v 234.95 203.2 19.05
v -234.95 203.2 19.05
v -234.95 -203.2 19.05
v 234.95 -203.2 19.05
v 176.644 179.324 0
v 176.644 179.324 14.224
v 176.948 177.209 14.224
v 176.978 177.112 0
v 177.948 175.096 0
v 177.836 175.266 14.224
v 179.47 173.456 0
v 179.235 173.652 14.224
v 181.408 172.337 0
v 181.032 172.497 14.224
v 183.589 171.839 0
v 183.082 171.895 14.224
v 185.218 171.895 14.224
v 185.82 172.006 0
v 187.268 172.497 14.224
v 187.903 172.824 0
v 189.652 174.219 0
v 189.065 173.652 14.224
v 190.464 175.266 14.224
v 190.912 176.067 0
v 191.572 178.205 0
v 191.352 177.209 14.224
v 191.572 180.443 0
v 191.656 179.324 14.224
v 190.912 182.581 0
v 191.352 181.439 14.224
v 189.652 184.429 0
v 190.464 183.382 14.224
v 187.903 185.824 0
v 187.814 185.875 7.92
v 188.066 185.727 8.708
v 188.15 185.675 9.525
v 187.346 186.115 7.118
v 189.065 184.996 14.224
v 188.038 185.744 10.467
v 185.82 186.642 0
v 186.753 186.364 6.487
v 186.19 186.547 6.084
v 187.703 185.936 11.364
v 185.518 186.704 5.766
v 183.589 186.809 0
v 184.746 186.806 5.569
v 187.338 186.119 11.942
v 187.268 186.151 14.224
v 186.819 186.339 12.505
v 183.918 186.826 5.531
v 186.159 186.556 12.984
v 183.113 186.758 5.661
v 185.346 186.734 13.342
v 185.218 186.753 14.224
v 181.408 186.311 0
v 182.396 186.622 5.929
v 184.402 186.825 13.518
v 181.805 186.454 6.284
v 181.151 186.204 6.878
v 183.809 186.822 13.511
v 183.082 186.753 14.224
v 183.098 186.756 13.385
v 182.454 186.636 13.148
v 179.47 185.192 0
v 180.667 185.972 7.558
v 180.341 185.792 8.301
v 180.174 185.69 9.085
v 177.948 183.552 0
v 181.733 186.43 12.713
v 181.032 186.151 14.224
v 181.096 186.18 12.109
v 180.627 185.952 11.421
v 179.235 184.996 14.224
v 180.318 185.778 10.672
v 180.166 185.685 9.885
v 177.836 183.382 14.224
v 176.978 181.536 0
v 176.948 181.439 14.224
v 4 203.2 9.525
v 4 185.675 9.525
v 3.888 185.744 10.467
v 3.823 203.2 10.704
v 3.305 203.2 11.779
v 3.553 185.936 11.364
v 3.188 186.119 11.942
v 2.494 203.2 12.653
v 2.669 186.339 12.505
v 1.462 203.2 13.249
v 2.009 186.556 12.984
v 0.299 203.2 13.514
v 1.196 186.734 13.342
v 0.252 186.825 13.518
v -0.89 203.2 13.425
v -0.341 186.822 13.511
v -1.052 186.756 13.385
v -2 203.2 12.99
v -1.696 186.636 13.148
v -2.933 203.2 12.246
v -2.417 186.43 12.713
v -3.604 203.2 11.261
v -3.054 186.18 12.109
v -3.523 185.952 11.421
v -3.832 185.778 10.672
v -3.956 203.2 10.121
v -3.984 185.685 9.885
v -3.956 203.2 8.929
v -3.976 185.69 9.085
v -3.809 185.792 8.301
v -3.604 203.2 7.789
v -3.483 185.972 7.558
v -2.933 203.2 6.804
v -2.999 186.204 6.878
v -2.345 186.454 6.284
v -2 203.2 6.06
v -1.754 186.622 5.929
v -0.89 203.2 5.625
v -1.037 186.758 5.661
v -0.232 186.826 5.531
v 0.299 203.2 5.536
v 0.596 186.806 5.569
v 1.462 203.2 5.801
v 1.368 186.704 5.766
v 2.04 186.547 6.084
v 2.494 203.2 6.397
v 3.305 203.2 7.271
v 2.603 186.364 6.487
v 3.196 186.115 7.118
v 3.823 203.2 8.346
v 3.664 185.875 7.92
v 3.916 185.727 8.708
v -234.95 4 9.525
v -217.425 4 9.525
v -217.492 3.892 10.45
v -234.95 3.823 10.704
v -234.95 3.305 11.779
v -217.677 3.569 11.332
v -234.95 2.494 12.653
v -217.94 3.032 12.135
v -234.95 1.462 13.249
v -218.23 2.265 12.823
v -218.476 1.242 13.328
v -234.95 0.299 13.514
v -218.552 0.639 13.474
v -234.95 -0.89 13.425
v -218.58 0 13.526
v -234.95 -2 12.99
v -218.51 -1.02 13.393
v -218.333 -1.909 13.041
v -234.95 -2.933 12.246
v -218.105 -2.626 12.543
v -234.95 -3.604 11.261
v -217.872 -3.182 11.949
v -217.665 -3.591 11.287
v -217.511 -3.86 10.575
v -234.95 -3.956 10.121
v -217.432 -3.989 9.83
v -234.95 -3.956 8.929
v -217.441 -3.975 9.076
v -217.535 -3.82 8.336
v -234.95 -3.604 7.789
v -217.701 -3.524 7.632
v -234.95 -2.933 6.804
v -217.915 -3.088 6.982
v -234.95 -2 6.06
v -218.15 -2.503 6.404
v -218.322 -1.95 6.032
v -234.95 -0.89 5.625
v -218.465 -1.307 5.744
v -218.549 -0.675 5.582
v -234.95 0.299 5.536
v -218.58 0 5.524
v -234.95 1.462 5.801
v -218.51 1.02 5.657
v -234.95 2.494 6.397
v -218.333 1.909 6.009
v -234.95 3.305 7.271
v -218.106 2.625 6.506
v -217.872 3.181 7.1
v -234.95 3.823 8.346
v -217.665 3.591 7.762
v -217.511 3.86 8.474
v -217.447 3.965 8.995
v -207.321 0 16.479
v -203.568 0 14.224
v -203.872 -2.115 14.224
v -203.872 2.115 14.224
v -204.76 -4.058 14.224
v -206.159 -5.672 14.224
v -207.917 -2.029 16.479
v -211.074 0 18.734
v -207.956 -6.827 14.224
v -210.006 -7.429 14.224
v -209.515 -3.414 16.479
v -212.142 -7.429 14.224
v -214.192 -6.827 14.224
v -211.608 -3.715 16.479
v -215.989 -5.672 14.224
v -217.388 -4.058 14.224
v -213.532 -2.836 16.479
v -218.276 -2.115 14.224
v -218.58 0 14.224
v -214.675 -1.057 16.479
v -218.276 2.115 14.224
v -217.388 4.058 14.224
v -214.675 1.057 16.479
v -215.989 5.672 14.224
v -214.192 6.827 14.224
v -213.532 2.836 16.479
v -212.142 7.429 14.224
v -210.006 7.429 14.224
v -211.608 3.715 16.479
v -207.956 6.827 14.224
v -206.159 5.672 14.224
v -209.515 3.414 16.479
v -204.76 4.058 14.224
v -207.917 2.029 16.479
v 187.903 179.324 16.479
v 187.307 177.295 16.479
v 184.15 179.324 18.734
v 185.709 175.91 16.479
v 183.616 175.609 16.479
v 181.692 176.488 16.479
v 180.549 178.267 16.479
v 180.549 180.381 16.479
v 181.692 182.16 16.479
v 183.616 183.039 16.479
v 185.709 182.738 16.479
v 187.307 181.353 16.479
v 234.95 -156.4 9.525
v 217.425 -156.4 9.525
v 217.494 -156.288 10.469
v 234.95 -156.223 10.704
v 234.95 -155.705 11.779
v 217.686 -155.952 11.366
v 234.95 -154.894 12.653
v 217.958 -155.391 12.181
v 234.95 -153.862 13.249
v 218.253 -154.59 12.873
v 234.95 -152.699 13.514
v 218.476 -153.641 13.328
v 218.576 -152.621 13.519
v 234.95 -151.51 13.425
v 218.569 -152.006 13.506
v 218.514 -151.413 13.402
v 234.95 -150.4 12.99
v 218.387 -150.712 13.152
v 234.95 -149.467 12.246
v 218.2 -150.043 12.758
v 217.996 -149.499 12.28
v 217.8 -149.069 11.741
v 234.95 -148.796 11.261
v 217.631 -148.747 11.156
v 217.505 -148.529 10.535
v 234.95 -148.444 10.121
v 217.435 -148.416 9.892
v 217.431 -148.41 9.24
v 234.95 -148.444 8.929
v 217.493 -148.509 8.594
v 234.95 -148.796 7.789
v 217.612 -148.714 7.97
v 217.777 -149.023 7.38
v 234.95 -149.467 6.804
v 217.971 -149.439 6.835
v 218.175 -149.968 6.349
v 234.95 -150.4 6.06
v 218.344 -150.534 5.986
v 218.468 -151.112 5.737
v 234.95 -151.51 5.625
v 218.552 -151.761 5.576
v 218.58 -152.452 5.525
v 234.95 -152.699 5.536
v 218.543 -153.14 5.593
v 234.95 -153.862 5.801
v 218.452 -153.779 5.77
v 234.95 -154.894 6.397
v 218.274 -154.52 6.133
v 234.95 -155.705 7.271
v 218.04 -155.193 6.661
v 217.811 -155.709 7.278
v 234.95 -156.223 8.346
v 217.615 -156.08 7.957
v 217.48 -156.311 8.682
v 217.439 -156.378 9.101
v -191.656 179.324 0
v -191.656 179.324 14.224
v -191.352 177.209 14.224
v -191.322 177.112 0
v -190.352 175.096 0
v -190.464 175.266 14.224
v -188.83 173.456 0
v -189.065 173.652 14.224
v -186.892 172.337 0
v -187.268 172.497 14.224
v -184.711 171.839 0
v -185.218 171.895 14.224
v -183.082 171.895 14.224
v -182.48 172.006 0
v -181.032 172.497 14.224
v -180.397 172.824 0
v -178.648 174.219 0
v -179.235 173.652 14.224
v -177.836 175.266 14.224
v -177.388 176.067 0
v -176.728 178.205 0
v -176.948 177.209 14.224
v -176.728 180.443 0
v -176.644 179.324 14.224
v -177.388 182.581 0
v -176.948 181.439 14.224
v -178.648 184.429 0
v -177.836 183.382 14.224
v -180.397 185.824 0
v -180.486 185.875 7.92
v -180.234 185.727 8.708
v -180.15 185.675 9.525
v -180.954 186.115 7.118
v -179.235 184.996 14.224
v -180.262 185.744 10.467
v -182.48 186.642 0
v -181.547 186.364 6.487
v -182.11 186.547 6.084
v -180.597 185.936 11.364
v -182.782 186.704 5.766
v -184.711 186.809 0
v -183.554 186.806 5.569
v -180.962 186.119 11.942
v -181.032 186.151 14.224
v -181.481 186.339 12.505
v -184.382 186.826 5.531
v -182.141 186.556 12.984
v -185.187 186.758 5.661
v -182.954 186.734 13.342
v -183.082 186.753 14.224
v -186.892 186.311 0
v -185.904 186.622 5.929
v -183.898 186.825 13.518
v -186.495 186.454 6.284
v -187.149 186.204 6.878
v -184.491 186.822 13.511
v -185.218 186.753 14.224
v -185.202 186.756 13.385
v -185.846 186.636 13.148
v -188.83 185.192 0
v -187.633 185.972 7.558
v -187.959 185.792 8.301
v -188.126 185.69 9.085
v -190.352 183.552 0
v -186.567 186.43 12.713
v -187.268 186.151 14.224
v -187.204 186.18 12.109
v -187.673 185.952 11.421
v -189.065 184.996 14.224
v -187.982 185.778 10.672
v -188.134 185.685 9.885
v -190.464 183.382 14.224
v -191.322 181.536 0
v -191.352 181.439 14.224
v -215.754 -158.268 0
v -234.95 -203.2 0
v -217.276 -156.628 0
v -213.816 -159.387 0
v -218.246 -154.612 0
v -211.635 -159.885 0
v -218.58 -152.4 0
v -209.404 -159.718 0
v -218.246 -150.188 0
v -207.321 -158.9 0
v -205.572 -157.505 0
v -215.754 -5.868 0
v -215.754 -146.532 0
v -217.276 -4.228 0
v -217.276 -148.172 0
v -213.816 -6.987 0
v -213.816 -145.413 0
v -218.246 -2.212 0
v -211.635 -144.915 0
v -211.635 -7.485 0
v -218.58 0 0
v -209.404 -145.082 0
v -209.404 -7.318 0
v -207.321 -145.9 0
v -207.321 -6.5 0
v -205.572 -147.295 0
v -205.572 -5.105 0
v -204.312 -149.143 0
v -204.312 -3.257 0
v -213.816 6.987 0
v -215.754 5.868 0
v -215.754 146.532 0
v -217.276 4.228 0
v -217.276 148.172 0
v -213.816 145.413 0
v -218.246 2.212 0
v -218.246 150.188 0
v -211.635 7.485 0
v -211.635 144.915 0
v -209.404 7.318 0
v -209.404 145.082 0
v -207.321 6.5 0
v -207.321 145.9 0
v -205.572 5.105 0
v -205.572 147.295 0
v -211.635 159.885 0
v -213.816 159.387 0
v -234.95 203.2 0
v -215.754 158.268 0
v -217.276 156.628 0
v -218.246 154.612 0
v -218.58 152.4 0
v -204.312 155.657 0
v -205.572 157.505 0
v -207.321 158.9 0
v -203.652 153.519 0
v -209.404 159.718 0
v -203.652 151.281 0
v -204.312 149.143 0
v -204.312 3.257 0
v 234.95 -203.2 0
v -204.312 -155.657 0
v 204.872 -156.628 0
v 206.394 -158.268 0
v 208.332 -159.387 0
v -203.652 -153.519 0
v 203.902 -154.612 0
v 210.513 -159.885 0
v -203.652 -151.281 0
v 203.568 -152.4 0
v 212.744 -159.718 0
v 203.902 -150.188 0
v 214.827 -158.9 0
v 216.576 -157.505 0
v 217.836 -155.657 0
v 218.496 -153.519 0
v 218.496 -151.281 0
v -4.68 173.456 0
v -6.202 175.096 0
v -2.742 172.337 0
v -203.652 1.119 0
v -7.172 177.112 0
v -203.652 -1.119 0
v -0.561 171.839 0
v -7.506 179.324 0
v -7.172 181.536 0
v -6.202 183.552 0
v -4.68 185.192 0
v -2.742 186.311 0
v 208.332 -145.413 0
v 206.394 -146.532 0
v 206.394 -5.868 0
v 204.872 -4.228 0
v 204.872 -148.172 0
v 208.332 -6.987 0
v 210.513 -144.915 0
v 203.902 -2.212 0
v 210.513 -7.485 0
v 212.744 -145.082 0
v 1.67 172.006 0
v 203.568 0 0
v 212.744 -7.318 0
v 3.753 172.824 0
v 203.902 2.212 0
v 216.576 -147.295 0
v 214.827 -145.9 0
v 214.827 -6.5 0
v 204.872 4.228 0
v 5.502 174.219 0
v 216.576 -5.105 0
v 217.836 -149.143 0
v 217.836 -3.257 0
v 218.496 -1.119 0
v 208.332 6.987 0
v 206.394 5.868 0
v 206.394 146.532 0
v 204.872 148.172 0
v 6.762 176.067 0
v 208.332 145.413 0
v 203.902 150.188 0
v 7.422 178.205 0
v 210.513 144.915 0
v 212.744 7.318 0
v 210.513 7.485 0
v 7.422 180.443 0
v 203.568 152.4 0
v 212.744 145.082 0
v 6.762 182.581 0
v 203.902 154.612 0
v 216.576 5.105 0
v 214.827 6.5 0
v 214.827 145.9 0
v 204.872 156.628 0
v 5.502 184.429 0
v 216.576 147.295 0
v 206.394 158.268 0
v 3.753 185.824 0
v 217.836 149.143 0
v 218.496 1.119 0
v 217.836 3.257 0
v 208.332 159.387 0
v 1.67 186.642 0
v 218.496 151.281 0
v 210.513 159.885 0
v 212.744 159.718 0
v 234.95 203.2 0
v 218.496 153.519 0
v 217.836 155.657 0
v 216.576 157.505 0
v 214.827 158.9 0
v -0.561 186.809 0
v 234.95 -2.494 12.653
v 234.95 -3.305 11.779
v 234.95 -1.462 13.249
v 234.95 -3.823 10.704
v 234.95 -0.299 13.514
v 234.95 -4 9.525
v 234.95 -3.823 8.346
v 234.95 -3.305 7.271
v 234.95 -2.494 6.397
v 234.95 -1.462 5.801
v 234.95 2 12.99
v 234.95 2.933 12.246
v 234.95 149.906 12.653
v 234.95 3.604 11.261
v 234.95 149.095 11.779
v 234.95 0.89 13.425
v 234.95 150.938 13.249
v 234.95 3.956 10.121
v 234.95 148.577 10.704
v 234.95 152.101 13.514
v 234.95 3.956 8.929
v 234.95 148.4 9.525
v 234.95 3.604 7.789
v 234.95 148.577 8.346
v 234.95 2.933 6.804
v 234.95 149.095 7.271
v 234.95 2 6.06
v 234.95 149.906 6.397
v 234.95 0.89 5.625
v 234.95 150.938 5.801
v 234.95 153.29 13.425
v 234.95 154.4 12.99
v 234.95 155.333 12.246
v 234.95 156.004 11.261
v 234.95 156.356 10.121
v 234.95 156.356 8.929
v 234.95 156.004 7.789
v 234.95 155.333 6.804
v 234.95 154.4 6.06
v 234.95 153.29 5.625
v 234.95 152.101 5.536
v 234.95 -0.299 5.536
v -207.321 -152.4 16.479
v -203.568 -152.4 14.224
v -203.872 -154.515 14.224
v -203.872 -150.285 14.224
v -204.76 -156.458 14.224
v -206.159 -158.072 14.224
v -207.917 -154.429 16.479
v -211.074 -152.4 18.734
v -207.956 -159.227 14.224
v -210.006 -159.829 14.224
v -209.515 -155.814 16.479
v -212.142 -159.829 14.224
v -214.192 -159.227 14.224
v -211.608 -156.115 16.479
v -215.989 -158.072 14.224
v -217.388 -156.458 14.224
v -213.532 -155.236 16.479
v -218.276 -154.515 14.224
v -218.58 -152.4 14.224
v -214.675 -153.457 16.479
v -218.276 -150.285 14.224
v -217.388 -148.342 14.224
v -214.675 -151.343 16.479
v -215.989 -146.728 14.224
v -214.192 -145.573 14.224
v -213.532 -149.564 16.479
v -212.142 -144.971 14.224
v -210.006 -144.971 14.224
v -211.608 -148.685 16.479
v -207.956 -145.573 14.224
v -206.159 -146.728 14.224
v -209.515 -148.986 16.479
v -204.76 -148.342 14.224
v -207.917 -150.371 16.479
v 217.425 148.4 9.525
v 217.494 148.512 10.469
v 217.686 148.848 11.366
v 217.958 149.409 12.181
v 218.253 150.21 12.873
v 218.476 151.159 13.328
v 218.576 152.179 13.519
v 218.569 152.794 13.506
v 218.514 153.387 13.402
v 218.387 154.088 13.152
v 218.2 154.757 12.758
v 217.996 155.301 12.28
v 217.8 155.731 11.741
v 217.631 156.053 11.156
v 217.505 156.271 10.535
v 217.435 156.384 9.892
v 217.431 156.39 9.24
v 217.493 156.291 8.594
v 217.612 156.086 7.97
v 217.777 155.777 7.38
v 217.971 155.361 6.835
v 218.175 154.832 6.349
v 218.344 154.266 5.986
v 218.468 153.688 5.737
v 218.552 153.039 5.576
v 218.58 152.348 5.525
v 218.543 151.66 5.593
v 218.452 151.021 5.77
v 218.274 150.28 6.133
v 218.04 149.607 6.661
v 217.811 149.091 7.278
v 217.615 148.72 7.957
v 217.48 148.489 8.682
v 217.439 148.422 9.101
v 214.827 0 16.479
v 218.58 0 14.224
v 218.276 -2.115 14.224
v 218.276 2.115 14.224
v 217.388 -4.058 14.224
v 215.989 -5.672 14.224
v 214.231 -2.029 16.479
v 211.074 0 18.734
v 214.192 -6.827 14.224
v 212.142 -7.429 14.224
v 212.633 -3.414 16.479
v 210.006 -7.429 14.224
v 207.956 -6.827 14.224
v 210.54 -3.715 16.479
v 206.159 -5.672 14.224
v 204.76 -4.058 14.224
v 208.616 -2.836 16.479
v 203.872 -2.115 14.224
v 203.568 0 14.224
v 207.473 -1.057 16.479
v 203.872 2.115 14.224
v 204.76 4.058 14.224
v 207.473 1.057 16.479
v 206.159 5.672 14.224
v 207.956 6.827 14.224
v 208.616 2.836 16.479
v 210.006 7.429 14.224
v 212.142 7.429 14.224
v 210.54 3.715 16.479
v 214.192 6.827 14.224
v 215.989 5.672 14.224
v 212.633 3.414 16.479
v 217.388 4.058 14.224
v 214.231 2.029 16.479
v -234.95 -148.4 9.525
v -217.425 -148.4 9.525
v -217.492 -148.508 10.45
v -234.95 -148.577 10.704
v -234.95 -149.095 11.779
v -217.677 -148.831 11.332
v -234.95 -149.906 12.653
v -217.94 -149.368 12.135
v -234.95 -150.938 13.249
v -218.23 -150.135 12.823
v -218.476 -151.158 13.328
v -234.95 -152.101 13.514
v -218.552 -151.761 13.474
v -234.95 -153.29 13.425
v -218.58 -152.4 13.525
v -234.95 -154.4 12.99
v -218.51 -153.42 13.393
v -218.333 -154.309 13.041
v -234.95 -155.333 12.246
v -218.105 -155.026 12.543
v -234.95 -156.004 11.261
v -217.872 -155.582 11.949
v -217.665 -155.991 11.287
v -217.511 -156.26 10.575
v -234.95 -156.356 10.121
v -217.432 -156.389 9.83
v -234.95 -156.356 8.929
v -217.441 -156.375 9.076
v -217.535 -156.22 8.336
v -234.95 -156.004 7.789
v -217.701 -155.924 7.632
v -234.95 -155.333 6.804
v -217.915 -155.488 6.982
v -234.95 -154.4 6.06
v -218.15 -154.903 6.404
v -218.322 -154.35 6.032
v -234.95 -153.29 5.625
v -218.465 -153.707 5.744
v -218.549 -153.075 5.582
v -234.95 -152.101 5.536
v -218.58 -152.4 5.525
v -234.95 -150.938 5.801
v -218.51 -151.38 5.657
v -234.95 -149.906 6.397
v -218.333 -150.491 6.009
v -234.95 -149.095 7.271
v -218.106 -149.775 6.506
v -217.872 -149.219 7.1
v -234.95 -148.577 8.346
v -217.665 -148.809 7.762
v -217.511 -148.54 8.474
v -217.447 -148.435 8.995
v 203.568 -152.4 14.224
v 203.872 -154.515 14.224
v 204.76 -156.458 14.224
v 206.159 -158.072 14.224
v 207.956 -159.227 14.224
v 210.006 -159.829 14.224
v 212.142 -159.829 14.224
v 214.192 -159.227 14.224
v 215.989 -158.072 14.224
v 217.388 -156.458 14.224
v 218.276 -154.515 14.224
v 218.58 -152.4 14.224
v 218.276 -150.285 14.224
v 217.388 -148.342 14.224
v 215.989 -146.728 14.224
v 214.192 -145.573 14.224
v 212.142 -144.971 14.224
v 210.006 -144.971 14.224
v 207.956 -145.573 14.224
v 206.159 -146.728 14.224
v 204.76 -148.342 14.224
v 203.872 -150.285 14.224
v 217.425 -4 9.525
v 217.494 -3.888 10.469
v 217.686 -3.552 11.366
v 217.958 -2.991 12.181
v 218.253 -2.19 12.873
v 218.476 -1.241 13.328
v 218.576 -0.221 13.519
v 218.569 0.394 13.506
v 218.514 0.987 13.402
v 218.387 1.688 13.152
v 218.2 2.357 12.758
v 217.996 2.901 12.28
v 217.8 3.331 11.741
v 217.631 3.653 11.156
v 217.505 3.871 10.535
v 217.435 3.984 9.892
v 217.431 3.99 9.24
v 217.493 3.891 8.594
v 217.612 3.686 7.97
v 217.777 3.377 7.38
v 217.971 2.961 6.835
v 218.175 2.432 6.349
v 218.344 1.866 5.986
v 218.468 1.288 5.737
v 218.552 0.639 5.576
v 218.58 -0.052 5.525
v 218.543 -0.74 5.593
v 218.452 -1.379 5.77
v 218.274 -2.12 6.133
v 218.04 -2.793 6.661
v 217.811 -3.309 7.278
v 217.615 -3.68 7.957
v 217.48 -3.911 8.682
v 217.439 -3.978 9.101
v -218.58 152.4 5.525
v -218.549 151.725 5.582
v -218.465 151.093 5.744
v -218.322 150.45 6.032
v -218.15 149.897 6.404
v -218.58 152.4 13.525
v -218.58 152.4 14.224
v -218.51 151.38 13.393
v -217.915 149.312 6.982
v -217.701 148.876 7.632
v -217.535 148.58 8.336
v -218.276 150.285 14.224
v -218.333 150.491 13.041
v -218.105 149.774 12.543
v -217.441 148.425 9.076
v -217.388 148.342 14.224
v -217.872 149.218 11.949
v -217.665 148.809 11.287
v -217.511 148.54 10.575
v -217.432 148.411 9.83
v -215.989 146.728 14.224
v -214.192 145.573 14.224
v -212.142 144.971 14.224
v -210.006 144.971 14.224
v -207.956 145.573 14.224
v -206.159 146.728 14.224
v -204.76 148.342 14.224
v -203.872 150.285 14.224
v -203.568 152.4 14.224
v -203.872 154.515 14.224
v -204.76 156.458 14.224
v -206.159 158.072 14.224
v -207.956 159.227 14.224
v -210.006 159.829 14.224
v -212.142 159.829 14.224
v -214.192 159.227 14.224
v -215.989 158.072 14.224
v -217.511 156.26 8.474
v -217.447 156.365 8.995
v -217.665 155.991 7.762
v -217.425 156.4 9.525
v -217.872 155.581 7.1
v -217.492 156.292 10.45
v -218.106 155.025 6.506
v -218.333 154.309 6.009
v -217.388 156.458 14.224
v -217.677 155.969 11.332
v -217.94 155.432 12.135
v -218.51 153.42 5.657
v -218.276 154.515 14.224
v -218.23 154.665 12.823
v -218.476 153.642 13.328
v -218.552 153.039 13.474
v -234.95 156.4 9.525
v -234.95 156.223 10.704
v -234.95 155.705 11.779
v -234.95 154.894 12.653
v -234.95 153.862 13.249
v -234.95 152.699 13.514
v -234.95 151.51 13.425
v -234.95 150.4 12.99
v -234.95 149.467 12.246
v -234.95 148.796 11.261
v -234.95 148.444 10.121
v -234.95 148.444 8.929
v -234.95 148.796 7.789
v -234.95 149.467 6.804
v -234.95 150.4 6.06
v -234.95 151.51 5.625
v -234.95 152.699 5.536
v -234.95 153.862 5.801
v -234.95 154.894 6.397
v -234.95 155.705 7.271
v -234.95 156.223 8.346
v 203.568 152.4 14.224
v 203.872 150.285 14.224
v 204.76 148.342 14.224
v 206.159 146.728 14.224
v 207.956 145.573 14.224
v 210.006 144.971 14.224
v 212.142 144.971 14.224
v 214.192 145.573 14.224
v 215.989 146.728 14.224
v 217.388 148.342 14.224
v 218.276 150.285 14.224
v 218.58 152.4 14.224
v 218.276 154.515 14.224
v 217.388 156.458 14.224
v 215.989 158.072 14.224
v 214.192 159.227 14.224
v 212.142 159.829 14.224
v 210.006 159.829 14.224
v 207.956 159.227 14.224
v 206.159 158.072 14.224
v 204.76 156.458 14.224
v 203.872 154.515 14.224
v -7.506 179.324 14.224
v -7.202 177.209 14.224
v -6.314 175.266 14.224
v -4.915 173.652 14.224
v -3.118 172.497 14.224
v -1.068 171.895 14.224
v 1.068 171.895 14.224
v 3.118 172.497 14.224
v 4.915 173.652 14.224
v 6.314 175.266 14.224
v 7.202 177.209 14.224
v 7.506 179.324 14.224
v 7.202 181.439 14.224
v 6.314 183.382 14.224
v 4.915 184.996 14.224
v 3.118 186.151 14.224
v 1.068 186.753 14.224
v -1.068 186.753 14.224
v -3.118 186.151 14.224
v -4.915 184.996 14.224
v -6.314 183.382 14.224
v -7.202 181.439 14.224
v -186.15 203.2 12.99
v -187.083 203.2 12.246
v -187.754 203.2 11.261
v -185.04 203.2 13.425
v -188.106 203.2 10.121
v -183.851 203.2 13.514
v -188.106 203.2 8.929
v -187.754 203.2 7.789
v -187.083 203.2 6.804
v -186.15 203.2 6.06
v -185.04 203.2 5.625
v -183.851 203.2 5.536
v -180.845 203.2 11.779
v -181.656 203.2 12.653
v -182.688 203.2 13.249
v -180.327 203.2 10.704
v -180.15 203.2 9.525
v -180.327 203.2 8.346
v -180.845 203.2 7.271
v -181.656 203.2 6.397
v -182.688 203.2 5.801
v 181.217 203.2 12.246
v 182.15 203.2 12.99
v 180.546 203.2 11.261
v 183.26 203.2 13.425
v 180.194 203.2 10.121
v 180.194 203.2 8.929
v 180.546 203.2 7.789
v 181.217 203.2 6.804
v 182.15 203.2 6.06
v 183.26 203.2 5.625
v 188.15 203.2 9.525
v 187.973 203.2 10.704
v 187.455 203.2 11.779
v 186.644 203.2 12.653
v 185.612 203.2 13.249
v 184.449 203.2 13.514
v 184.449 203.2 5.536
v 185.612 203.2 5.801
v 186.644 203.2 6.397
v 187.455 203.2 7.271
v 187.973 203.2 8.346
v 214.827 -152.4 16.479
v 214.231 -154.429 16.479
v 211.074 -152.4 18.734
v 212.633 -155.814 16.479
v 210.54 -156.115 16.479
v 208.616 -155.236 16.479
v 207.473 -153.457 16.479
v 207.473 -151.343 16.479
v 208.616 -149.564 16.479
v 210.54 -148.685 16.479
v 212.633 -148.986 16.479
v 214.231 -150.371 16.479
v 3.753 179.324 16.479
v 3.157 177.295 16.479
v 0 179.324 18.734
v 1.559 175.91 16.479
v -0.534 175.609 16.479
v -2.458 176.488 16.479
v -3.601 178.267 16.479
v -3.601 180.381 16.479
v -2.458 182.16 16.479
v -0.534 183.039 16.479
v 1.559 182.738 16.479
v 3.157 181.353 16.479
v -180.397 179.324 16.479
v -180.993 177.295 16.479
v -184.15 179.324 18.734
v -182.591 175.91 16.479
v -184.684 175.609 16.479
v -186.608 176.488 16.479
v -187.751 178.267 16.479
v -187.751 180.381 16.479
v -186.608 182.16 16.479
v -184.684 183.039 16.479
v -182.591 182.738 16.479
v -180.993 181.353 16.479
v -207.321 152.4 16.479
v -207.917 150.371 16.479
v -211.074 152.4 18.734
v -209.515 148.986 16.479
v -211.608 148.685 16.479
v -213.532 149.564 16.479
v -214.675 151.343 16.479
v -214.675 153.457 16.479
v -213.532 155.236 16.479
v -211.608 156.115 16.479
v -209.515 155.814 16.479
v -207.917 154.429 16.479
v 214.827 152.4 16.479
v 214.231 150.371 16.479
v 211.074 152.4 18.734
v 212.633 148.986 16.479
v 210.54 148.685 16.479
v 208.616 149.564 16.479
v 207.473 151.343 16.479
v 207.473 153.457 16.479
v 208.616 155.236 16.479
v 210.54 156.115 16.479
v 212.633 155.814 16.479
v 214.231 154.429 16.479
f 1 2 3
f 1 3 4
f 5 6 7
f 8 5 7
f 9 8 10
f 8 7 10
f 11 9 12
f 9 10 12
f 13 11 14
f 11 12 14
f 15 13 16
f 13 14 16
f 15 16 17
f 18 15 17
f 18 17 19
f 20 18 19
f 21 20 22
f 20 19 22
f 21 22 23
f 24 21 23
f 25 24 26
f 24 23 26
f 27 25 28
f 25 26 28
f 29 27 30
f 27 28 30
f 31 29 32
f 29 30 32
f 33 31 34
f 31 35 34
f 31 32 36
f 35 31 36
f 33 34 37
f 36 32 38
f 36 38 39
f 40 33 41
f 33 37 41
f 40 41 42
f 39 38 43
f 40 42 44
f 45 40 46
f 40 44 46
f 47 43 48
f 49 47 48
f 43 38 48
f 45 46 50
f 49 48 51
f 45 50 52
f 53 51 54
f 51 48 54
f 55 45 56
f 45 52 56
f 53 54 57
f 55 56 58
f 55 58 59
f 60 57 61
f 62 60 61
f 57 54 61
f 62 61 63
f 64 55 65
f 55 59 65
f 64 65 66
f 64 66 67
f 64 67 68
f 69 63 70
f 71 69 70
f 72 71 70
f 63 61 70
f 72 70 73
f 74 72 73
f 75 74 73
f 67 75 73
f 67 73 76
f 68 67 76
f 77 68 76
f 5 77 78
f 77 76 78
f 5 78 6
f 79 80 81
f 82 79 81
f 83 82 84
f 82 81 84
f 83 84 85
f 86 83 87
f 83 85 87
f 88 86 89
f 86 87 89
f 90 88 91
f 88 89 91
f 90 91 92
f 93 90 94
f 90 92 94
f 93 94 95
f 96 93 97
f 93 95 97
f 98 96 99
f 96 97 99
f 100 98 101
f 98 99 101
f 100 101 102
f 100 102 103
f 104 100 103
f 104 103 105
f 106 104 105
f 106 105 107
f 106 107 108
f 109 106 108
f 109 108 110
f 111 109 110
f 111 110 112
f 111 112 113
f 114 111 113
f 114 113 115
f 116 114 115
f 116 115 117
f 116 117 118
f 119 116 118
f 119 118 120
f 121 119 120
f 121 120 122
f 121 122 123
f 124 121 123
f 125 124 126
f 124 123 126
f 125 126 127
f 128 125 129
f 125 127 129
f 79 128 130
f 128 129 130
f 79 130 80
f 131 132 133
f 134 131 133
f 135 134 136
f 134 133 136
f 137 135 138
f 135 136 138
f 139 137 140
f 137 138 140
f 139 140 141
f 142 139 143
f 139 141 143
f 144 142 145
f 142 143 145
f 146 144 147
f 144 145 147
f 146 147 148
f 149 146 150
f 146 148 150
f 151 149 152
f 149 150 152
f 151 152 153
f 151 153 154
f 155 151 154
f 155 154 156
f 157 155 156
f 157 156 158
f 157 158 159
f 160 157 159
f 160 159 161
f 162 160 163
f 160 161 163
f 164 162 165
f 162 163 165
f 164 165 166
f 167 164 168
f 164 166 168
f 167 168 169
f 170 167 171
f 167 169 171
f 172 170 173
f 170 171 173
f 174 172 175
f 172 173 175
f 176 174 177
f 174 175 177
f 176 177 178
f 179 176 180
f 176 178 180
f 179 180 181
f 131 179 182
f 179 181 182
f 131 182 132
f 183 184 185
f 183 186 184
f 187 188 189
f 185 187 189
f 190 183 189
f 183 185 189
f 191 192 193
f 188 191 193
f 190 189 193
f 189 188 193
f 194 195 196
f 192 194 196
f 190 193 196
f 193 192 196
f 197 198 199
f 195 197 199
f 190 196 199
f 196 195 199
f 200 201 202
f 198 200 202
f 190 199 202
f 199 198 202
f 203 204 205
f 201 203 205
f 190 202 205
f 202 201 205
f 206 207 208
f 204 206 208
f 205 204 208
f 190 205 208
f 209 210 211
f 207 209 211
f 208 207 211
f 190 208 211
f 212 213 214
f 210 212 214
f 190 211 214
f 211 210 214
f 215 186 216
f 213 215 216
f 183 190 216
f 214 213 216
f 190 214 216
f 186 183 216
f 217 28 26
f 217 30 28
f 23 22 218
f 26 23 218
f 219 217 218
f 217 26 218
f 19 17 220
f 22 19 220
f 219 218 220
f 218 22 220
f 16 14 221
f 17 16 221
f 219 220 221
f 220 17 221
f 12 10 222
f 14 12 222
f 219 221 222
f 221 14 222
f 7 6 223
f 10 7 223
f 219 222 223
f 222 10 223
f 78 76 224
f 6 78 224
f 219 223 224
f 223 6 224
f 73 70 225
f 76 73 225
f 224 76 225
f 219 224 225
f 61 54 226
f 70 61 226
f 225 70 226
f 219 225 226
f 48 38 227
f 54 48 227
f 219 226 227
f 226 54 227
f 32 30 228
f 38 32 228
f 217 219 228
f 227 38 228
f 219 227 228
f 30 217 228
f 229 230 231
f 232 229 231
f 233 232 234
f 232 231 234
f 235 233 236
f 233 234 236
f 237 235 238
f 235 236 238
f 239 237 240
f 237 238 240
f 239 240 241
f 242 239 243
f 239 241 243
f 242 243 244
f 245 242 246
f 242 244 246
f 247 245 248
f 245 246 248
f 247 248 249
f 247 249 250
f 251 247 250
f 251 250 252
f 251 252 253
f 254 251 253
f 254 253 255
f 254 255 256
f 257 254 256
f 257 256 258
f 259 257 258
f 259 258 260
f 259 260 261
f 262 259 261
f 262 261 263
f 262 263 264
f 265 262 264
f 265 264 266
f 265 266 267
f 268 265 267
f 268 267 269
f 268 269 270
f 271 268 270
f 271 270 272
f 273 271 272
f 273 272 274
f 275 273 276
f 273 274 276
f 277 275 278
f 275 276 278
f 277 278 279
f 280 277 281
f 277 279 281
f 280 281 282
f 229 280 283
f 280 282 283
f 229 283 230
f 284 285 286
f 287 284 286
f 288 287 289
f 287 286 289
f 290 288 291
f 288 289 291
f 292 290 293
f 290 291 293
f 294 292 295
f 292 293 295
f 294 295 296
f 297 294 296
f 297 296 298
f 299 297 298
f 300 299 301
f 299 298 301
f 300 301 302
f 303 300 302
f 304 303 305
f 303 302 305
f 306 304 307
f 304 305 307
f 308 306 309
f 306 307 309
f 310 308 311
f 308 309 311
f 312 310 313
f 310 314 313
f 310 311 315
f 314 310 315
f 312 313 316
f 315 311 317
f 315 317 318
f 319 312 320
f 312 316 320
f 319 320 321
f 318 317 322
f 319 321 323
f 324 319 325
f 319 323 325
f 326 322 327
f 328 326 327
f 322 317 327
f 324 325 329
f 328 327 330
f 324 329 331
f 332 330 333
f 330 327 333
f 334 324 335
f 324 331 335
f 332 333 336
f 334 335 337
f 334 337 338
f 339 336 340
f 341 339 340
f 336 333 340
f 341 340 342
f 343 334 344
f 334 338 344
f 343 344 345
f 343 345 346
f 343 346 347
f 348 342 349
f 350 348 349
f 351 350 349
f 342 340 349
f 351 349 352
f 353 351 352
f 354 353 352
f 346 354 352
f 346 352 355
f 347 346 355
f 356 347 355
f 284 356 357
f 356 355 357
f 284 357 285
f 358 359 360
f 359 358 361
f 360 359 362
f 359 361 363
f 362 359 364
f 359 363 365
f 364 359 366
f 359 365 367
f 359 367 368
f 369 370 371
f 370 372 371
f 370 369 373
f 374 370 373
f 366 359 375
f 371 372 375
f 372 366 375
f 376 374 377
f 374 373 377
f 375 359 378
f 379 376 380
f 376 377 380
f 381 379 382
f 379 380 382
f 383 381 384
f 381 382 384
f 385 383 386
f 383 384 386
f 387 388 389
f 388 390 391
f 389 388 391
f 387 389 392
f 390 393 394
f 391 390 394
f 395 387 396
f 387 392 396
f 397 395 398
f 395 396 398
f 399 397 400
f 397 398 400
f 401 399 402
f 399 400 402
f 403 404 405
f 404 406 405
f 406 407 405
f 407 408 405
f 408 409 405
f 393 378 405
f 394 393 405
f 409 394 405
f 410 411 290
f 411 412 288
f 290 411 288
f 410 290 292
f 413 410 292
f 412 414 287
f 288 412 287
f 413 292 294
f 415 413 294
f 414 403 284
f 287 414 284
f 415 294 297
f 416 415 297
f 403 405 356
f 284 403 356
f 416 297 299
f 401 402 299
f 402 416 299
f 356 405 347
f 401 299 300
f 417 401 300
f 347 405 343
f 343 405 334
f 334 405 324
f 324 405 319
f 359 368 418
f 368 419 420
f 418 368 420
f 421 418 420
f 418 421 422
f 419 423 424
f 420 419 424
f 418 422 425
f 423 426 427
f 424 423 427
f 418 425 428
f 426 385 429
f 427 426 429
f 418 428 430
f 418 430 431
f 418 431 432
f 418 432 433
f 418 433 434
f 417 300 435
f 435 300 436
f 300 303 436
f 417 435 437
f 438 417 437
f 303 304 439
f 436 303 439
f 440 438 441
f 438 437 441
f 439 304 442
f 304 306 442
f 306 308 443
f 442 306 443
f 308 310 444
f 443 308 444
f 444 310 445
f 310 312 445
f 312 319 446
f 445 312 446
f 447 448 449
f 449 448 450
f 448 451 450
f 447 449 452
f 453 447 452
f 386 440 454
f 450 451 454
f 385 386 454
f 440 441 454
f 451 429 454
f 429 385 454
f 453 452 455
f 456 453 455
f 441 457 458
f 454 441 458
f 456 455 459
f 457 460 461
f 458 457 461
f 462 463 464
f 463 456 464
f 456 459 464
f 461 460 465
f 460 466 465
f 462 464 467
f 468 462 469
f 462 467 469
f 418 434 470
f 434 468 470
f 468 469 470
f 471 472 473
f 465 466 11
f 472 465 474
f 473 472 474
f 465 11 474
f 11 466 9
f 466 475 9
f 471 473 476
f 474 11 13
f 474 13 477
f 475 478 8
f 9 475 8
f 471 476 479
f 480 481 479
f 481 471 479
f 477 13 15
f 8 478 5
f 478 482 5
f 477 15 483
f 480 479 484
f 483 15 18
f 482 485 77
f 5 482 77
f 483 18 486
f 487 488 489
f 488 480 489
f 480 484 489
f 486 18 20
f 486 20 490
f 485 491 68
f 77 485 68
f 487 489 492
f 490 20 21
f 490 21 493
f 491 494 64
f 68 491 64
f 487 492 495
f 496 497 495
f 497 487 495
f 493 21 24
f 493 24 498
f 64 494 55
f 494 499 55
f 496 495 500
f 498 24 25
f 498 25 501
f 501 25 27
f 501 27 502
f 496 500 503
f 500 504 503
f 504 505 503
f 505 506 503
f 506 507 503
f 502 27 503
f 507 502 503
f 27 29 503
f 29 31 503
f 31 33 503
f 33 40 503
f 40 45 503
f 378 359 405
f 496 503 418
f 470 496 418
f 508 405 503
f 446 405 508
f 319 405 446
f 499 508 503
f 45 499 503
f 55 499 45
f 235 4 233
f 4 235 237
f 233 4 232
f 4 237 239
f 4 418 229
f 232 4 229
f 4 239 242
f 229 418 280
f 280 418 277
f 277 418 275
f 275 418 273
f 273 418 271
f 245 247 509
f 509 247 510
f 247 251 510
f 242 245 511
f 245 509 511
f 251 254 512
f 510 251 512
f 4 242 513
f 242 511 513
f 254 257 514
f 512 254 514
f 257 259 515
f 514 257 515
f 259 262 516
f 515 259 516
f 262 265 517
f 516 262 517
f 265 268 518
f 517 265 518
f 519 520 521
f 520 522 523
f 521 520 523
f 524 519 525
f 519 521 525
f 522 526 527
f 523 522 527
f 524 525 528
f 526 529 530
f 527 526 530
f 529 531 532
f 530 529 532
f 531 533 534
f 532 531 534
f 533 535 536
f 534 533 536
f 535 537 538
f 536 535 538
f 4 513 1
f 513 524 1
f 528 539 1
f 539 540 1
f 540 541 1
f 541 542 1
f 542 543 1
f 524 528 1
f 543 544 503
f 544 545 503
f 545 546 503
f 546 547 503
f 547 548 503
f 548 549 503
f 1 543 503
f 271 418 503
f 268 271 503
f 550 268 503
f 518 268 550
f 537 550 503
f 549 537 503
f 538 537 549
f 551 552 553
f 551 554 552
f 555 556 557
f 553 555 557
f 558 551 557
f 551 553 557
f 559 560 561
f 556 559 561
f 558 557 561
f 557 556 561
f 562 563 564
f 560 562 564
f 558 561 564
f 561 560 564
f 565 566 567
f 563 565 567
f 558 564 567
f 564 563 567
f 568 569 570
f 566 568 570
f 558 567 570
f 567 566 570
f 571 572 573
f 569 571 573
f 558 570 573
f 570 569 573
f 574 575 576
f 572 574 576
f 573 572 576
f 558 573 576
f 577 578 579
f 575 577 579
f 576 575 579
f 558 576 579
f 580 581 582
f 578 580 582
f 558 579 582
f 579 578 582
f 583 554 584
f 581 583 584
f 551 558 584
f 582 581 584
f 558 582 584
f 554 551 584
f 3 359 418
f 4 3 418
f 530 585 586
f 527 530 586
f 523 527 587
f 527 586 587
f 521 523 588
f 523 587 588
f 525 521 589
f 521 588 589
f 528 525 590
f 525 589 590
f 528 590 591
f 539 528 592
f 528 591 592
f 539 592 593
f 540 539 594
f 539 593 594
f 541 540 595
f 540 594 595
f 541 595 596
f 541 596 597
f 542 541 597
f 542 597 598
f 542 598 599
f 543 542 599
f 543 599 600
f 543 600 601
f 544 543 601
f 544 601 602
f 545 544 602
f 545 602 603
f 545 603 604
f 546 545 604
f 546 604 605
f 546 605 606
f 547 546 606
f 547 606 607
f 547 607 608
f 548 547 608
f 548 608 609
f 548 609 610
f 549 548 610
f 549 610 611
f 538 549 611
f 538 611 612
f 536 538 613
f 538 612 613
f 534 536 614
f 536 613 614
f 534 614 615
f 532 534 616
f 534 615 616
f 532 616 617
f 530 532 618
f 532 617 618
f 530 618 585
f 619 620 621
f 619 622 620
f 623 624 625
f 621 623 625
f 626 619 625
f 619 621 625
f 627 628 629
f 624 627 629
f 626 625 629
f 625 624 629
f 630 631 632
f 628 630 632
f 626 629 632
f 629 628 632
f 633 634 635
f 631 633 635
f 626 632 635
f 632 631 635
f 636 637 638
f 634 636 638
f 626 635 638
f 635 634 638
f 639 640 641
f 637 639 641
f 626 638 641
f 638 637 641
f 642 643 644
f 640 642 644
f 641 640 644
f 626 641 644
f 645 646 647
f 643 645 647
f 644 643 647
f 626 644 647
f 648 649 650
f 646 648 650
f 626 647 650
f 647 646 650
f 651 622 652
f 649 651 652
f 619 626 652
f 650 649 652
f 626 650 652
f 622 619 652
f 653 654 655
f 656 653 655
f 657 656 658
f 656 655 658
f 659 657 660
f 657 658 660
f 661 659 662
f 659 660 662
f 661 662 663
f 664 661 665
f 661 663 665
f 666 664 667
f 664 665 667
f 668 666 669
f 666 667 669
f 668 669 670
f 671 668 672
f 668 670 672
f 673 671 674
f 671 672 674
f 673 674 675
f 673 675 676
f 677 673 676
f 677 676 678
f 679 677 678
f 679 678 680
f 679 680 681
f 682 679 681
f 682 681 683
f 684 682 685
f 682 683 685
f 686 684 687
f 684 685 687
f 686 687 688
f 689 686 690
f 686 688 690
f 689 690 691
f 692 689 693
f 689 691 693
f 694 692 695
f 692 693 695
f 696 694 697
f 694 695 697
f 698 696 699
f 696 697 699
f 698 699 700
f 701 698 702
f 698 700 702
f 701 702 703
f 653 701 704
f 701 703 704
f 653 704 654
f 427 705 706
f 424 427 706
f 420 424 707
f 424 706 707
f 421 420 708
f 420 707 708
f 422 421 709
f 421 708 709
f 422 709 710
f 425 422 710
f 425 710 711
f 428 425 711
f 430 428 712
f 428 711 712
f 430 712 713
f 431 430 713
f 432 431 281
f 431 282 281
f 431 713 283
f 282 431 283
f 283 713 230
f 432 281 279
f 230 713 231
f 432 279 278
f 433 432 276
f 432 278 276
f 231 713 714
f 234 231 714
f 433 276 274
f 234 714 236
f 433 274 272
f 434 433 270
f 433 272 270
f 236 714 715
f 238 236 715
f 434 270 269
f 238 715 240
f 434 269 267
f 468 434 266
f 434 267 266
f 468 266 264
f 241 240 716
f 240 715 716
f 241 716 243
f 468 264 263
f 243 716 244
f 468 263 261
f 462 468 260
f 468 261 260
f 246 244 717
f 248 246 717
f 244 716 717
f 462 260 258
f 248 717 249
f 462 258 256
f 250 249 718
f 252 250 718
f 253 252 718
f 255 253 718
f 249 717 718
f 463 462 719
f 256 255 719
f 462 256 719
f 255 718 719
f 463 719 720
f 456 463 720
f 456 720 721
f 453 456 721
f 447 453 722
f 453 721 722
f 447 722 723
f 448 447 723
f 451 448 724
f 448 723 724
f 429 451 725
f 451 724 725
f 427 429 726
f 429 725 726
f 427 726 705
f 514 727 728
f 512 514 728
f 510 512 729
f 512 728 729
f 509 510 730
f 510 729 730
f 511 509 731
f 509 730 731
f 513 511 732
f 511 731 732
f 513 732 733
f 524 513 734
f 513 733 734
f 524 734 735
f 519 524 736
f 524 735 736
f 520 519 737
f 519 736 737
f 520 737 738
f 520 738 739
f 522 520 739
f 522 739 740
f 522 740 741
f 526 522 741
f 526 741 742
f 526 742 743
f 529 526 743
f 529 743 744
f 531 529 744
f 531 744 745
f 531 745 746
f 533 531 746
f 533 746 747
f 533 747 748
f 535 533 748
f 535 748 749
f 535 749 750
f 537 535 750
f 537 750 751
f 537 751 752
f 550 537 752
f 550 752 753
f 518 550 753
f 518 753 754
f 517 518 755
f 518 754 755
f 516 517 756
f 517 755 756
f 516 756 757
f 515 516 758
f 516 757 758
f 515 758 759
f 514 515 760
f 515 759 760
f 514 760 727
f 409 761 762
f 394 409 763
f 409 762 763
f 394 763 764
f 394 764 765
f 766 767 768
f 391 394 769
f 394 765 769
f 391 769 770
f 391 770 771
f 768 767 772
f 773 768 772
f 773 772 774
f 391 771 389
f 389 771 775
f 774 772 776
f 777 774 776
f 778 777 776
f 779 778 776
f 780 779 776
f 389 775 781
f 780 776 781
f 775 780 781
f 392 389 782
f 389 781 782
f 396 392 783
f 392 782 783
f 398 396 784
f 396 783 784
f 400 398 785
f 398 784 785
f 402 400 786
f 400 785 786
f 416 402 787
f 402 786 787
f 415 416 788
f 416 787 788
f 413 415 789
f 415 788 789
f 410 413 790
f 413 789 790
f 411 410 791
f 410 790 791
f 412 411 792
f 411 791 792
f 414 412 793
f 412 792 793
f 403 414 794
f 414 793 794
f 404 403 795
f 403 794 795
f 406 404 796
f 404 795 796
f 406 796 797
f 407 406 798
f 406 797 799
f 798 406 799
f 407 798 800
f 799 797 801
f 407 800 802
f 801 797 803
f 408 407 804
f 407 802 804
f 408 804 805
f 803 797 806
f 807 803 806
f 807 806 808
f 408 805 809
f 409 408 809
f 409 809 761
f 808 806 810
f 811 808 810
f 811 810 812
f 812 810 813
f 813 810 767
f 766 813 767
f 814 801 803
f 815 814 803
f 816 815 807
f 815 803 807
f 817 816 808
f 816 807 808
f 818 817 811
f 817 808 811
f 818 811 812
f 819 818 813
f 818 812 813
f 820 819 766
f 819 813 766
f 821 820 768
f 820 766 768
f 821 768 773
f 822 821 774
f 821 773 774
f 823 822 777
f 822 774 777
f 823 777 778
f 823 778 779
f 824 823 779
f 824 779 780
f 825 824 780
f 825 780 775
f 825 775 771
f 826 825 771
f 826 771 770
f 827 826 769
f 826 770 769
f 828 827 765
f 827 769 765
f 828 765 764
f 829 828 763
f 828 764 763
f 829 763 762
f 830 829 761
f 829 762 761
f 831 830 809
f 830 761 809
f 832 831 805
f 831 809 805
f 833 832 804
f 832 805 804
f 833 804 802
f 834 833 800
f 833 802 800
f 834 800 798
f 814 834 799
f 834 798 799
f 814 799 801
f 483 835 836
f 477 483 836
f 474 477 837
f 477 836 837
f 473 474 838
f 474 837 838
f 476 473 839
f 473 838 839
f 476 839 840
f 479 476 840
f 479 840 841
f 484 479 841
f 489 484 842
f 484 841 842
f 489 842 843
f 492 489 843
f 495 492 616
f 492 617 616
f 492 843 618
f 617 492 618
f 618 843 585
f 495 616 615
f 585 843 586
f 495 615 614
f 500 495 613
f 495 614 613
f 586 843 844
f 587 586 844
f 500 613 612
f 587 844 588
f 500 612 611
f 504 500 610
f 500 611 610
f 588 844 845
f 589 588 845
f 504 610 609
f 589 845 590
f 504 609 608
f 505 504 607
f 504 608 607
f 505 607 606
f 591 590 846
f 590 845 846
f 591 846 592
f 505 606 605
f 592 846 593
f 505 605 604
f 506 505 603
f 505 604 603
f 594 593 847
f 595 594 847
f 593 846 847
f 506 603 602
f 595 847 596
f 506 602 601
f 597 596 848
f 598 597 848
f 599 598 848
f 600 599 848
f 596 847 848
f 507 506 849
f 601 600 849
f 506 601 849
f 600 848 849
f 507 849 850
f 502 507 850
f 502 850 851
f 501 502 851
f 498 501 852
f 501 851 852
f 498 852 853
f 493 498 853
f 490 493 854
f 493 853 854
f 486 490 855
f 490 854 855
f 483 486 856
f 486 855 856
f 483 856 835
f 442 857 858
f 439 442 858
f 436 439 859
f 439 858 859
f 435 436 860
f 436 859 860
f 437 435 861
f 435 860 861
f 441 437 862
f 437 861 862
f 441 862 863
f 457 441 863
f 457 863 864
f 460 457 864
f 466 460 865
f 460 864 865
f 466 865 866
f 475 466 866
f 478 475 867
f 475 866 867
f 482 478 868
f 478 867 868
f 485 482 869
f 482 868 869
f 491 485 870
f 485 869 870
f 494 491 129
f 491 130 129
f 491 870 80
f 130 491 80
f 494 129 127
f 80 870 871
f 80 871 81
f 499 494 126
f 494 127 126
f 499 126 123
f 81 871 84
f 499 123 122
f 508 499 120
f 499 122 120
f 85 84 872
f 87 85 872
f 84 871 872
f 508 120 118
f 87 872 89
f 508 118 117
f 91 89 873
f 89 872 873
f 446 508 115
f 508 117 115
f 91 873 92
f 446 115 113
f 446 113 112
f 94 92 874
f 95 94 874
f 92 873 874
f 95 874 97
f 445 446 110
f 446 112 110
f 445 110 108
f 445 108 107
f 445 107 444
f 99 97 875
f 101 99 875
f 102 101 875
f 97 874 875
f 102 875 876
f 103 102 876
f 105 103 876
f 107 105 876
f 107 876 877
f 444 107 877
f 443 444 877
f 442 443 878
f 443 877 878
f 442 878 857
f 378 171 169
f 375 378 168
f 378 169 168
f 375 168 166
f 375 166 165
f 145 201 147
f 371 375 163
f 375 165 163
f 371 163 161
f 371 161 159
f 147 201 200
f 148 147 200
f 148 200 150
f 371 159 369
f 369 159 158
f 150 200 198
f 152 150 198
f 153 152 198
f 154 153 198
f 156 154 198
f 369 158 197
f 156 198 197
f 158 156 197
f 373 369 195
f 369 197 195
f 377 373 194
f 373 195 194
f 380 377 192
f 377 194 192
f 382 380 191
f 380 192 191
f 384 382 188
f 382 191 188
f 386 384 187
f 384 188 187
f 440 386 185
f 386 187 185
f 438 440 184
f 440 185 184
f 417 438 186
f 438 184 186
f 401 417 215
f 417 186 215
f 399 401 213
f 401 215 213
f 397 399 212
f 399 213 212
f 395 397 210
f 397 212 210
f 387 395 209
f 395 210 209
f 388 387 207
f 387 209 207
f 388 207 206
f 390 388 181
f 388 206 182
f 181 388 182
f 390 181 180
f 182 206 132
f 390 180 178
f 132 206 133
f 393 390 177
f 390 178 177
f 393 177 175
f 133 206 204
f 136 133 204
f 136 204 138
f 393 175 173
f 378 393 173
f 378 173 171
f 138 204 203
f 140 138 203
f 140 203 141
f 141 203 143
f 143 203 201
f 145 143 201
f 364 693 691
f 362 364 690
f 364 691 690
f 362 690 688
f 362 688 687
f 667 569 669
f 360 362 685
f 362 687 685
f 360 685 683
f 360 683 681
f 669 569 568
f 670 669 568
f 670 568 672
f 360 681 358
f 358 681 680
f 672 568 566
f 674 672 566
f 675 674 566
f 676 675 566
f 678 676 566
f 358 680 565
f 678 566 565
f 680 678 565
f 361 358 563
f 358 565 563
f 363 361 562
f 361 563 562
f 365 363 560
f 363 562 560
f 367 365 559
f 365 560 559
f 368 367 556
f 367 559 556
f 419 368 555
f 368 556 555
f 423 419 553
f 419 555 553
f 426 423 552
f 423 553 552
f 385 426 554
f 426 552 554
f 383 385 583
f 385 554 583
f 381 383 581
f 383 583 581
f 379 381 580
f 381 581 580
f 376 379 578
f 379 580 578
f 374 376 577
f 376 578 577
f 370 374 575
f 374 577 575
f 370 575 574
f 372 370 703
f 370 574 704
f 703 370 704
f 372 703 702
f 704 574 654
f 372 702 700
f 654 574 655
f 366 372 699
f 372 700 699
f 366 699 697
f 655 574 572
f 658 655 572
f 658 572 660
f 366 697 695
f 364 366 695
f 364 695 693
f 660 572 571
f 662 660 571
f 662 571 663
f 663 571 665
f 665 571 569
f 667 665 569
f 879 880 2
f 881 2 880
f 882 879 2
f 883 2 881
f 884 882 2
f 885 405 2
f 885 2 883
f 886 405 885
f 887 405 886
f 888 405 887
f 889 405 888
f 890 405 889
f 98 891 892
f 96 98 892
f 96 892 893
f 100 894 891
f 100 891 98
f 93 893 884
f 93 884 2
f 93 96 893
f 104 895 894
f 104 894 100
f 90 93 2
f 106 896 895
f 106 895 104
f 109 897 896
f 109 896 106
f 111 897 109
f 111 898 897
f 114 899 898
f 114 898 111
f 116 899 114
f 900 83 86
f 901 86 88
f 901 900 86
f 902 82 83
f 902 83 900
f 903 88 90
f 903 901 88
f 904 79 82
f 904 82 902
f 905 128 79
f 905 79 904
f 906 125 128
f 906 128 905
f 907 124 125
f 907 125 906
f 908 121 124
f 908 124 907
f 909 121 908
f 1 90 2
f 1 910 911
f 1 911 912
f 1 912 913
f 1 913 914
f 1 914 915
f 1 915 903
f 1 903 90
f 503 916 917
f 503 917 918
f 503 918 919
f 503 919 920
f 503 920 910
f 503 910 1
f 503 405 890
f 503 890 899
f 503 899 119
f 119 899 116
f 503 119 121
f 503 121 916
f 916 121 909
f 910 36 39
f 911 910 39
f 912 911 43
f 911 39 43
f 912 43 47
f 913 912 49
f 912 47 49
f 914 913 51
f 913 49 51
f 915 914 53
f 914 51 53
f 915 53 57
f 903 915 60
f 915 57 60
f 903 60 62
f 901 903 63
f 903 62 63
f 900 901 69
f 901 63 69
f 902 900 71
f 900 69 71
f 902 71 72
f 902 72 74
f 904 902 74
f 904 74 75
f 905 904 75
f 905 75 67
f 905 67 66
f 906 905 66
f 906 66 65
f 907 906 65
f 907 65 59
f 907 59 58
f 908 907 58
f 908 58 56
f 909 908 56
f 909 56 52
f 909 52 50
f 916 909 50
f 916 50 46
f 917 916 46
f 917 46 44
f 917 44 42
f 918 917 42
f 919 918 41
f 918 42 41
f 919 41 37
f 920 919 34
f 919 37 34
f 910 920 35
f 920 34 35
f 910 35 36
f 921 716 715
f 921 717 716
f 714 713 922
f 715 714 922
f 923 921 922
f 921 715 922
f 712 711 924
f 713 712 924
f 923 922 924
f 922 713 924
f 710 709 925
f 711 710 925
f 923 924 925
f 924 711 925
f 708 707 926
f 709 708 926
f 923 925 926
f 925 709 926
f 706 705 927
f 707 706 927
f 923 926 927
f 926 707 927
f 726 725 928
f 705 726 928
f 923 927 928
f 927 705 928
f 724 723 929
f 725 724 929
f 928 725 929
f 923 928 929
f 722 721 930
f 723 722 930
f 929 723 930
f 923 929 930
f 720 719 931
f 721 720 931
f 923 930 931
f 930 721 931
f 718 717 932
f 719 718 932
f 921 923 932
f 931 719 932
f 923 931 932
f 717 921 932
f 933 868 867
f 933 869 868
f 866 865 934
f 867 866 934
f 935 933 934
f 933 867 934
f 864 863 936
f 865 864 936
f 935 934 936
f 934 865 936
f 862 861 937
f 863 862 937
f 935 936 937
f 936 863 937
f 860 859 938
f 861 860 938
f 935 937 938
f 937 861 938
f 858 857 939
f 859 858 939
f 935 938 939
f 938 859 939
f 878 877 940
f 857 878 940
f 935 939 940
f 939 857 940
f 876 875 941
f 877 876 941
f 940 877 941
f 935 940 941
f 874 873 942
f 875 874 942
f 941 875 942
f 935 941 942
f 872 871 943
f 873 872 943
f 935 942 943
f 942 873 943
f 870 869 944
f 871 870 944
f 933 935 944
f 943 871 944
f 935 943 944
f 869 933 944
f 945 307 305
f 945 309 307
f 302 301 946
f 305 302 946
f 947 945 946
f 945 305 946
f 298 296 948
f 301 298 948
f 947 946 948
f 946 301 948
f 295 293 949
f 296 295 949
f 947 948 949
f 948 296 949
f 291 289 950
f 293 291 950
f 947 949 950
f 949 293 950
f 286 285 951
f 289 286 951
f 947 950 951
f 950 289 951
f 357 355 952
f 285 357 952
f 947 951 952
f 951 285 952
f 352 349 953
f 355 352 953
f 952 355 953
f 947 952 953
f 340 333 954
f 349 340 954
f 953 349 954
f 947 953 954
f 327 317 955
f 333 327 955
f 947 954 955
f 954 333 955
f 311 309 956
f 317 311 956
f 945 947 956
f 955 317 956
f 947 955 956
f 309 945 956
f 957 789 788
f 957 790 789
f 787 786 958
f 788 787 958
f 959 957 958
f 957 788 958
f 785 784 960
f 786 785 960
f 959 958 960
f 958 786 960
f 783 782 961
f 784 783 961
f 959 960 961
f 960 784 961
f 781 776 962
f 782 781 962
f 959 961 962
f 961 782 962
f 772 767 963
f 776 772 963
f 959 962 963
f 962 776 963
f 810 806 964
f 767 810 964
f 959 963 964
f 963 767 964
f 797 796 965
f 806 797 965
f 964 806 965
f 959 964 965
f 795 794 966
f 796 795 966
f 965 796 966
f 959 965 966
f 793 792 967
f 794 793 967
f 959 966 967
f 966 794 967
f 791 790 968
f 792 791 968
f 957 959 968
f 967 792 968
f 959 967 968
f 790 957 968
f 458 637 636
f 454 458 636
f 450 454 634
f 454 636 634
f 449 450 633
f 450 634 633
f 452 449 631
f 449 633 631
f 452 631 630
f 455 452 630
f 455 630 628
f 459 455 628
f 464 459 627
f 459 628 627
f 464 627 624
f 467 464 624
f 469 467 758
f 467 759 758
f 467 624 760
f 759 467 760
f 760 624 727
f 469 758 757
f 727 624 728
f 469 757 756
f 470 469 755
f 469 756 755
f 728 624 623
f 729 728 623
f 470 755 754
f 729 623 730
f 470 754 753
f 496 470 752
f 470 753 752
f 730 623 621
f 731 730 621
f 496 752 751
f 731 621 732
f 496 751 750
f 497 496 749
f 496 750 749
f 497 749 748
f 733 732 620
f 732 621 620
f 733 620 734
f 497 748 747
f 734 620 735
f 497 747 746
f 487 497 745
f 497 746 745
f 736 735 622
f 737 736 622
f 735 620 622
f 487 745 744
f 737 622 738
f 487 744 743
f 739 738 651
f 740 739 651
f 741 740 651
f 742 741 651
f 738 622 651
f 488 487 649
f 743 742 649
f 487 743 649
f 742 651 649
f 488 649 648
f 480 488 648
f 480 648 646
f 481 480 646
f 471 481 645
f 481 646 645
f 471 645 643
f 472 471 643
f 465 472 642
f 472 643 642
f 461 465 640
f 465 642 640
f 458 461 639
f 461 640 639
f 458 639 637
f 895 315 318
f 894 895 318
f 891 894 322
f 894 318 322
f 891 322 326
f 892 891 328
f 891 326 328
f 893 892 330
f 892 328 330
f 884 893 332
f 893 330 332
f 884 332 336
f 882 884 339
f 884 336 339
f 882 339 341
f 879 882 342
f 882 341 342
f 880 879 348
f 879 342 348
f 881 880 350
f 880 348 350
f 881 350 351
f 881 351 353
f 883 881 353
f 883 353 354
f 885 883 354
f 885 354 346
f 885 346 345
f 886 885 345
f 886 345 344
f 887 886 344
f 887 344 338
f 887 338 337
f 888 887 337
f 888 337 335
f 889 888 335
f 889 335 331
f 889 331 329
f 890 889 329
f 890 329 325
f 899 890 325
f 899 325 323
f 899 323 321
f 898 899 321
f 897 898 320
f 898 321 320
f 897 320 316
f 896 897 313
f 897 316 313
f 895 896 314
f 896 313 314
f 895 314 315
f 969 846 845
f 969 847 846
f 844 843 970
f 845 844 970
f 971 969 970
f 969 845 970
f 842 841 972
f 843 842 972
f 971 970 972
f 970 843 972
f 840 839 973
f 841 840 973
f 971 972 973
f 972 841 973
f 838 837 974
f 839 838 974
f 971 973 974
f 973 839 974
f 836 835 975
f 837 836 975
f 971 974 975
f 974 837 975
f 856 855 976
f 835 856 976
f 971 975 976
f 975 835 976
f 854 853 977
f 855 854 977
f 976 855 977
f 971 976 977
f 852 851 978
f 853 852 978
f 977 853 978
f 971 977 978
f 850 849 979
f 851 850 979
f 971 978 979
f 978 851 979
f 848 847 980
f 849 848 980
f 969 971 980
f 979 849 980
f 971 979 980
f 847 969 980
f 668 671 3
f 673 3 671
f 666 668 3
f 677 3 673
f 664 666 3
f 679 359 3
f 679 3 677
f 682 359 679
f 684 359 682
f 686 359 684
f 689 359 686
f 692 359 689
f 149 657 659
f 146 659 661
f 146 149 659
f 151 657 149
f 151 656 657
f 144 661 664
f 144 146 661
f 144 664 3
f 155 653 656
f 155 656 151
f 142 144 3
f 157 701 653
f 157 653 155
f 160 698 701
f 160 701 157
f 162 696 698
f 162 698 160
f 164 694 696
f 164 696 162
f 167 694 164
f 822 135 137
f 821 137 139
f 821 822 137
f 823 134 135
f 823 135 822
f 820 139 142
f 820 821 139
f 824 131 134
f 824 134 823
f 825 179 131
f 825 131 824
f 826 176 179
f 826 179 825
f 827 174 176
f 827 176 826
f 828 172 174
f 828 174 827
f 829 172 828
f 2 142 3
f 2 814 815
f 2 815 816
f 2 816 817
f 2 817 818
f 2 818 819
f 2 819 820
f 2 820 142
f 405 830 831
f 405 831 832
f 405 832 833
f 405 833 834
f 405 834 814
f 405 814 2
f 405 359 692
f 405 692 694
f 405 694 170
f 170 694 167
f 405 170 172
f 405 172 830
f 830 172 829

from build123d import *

# Parameters (mm, degrees)
F0_W     = 469.9
F0_H     = 406.4
F1_DEPTH = 19.05
F3_D     = 15.0114
F3_DEPTH = 14.224
F3_TIP   = 4.5098795482
F5_D     = 8.001
F5_DEPTH = 25.4
F5_TIP   = 2.4037429064
F7_D     = 8.001
F7_DEPTH = 25.4
F7_TIP   = 2.4037429064
F9_D     = 8.001
F9_DEPTH = 25.4
F9_TIP   = 2.4037429064


with BuildPart() as f1:
    # F0 (on Top) → F1 (new body)
    with BuildSketch(Plane.XY):
        Rectangle(F0_W, F0_H)
    extrude(amount=F1_DEPTH)

    # F3
    with Locations(Plane(origin=(0, 0, 0), x_dir=(1, 0, 0), z_dir=(0, 0, -1))):
        with Locations((-211.074, 152.4), (-211.074, 0), (-211.074, -152.4), (-184.15, -179.324), (0, -179.324), (184.15, -179.324), (211.074, -152.4), (211.074, 0), (211.074, 152.4)):
            Hole(F3_D / 2, depth=F3_DEPTH)
            with Locations((0, 0, -(F3_DEPTH + F3_TIP / 2))):  # 118° drill point
                Cone(0, F3_D / 2, F3_TIP, mode=Mode.SUBTRACT)

    # F5
    with Locations(Plane.YZ.offset(234.95)):
        with Locations((-152.4, 9.525), (0, 9.525), (152.4, 9.525)):
            Hole(F5_D / 2, depth=F5_DEPTH)
            with Locations((0, 0, -(F5_DEPTH + F5_TIP / 2))):  # 118° drill point
                Cone(0, F5_D / 2, F5_TIP, mode=Mode.SUBTRACT)

    # F7
    with Locations(Plane(origin=(0, 203.2, 0), x_dir=(-1, 0, 0), z_dir=(0, 1, 0))):
        with Locations((-184.15, 9.525), (0, 9.525), (184.15, 9.525)):
            Hole(F7_D / 2, depth=F7_DEPTH)
            with Locations((0, 0, -(F7_DEPTH + F7_TIP / 2))):  # 118° drill point
                Cone(0, F7_D / 2, F7_TIP, mode=Mode.SUBTRACT)

    # F9
    with Locations(Plane(origin=(-234.95, 0, 0), x_dir=(0, -1, 0), z_dir=(-1, 0, 0))):
        with Locations((-152.4, 9.525), (0, 9.525), (152.4, 9.525)):
            Hole(F9_D / 2, depth=F9_DEPTH)
            with Locations((0, 0, -(F9_DEPTH + F9_TIP / 2))):  # 118° drill point
                Cone(0, F9_D / 2, F9_TIP, mode=Mode.SUBTRACT)


solid = f1.part
